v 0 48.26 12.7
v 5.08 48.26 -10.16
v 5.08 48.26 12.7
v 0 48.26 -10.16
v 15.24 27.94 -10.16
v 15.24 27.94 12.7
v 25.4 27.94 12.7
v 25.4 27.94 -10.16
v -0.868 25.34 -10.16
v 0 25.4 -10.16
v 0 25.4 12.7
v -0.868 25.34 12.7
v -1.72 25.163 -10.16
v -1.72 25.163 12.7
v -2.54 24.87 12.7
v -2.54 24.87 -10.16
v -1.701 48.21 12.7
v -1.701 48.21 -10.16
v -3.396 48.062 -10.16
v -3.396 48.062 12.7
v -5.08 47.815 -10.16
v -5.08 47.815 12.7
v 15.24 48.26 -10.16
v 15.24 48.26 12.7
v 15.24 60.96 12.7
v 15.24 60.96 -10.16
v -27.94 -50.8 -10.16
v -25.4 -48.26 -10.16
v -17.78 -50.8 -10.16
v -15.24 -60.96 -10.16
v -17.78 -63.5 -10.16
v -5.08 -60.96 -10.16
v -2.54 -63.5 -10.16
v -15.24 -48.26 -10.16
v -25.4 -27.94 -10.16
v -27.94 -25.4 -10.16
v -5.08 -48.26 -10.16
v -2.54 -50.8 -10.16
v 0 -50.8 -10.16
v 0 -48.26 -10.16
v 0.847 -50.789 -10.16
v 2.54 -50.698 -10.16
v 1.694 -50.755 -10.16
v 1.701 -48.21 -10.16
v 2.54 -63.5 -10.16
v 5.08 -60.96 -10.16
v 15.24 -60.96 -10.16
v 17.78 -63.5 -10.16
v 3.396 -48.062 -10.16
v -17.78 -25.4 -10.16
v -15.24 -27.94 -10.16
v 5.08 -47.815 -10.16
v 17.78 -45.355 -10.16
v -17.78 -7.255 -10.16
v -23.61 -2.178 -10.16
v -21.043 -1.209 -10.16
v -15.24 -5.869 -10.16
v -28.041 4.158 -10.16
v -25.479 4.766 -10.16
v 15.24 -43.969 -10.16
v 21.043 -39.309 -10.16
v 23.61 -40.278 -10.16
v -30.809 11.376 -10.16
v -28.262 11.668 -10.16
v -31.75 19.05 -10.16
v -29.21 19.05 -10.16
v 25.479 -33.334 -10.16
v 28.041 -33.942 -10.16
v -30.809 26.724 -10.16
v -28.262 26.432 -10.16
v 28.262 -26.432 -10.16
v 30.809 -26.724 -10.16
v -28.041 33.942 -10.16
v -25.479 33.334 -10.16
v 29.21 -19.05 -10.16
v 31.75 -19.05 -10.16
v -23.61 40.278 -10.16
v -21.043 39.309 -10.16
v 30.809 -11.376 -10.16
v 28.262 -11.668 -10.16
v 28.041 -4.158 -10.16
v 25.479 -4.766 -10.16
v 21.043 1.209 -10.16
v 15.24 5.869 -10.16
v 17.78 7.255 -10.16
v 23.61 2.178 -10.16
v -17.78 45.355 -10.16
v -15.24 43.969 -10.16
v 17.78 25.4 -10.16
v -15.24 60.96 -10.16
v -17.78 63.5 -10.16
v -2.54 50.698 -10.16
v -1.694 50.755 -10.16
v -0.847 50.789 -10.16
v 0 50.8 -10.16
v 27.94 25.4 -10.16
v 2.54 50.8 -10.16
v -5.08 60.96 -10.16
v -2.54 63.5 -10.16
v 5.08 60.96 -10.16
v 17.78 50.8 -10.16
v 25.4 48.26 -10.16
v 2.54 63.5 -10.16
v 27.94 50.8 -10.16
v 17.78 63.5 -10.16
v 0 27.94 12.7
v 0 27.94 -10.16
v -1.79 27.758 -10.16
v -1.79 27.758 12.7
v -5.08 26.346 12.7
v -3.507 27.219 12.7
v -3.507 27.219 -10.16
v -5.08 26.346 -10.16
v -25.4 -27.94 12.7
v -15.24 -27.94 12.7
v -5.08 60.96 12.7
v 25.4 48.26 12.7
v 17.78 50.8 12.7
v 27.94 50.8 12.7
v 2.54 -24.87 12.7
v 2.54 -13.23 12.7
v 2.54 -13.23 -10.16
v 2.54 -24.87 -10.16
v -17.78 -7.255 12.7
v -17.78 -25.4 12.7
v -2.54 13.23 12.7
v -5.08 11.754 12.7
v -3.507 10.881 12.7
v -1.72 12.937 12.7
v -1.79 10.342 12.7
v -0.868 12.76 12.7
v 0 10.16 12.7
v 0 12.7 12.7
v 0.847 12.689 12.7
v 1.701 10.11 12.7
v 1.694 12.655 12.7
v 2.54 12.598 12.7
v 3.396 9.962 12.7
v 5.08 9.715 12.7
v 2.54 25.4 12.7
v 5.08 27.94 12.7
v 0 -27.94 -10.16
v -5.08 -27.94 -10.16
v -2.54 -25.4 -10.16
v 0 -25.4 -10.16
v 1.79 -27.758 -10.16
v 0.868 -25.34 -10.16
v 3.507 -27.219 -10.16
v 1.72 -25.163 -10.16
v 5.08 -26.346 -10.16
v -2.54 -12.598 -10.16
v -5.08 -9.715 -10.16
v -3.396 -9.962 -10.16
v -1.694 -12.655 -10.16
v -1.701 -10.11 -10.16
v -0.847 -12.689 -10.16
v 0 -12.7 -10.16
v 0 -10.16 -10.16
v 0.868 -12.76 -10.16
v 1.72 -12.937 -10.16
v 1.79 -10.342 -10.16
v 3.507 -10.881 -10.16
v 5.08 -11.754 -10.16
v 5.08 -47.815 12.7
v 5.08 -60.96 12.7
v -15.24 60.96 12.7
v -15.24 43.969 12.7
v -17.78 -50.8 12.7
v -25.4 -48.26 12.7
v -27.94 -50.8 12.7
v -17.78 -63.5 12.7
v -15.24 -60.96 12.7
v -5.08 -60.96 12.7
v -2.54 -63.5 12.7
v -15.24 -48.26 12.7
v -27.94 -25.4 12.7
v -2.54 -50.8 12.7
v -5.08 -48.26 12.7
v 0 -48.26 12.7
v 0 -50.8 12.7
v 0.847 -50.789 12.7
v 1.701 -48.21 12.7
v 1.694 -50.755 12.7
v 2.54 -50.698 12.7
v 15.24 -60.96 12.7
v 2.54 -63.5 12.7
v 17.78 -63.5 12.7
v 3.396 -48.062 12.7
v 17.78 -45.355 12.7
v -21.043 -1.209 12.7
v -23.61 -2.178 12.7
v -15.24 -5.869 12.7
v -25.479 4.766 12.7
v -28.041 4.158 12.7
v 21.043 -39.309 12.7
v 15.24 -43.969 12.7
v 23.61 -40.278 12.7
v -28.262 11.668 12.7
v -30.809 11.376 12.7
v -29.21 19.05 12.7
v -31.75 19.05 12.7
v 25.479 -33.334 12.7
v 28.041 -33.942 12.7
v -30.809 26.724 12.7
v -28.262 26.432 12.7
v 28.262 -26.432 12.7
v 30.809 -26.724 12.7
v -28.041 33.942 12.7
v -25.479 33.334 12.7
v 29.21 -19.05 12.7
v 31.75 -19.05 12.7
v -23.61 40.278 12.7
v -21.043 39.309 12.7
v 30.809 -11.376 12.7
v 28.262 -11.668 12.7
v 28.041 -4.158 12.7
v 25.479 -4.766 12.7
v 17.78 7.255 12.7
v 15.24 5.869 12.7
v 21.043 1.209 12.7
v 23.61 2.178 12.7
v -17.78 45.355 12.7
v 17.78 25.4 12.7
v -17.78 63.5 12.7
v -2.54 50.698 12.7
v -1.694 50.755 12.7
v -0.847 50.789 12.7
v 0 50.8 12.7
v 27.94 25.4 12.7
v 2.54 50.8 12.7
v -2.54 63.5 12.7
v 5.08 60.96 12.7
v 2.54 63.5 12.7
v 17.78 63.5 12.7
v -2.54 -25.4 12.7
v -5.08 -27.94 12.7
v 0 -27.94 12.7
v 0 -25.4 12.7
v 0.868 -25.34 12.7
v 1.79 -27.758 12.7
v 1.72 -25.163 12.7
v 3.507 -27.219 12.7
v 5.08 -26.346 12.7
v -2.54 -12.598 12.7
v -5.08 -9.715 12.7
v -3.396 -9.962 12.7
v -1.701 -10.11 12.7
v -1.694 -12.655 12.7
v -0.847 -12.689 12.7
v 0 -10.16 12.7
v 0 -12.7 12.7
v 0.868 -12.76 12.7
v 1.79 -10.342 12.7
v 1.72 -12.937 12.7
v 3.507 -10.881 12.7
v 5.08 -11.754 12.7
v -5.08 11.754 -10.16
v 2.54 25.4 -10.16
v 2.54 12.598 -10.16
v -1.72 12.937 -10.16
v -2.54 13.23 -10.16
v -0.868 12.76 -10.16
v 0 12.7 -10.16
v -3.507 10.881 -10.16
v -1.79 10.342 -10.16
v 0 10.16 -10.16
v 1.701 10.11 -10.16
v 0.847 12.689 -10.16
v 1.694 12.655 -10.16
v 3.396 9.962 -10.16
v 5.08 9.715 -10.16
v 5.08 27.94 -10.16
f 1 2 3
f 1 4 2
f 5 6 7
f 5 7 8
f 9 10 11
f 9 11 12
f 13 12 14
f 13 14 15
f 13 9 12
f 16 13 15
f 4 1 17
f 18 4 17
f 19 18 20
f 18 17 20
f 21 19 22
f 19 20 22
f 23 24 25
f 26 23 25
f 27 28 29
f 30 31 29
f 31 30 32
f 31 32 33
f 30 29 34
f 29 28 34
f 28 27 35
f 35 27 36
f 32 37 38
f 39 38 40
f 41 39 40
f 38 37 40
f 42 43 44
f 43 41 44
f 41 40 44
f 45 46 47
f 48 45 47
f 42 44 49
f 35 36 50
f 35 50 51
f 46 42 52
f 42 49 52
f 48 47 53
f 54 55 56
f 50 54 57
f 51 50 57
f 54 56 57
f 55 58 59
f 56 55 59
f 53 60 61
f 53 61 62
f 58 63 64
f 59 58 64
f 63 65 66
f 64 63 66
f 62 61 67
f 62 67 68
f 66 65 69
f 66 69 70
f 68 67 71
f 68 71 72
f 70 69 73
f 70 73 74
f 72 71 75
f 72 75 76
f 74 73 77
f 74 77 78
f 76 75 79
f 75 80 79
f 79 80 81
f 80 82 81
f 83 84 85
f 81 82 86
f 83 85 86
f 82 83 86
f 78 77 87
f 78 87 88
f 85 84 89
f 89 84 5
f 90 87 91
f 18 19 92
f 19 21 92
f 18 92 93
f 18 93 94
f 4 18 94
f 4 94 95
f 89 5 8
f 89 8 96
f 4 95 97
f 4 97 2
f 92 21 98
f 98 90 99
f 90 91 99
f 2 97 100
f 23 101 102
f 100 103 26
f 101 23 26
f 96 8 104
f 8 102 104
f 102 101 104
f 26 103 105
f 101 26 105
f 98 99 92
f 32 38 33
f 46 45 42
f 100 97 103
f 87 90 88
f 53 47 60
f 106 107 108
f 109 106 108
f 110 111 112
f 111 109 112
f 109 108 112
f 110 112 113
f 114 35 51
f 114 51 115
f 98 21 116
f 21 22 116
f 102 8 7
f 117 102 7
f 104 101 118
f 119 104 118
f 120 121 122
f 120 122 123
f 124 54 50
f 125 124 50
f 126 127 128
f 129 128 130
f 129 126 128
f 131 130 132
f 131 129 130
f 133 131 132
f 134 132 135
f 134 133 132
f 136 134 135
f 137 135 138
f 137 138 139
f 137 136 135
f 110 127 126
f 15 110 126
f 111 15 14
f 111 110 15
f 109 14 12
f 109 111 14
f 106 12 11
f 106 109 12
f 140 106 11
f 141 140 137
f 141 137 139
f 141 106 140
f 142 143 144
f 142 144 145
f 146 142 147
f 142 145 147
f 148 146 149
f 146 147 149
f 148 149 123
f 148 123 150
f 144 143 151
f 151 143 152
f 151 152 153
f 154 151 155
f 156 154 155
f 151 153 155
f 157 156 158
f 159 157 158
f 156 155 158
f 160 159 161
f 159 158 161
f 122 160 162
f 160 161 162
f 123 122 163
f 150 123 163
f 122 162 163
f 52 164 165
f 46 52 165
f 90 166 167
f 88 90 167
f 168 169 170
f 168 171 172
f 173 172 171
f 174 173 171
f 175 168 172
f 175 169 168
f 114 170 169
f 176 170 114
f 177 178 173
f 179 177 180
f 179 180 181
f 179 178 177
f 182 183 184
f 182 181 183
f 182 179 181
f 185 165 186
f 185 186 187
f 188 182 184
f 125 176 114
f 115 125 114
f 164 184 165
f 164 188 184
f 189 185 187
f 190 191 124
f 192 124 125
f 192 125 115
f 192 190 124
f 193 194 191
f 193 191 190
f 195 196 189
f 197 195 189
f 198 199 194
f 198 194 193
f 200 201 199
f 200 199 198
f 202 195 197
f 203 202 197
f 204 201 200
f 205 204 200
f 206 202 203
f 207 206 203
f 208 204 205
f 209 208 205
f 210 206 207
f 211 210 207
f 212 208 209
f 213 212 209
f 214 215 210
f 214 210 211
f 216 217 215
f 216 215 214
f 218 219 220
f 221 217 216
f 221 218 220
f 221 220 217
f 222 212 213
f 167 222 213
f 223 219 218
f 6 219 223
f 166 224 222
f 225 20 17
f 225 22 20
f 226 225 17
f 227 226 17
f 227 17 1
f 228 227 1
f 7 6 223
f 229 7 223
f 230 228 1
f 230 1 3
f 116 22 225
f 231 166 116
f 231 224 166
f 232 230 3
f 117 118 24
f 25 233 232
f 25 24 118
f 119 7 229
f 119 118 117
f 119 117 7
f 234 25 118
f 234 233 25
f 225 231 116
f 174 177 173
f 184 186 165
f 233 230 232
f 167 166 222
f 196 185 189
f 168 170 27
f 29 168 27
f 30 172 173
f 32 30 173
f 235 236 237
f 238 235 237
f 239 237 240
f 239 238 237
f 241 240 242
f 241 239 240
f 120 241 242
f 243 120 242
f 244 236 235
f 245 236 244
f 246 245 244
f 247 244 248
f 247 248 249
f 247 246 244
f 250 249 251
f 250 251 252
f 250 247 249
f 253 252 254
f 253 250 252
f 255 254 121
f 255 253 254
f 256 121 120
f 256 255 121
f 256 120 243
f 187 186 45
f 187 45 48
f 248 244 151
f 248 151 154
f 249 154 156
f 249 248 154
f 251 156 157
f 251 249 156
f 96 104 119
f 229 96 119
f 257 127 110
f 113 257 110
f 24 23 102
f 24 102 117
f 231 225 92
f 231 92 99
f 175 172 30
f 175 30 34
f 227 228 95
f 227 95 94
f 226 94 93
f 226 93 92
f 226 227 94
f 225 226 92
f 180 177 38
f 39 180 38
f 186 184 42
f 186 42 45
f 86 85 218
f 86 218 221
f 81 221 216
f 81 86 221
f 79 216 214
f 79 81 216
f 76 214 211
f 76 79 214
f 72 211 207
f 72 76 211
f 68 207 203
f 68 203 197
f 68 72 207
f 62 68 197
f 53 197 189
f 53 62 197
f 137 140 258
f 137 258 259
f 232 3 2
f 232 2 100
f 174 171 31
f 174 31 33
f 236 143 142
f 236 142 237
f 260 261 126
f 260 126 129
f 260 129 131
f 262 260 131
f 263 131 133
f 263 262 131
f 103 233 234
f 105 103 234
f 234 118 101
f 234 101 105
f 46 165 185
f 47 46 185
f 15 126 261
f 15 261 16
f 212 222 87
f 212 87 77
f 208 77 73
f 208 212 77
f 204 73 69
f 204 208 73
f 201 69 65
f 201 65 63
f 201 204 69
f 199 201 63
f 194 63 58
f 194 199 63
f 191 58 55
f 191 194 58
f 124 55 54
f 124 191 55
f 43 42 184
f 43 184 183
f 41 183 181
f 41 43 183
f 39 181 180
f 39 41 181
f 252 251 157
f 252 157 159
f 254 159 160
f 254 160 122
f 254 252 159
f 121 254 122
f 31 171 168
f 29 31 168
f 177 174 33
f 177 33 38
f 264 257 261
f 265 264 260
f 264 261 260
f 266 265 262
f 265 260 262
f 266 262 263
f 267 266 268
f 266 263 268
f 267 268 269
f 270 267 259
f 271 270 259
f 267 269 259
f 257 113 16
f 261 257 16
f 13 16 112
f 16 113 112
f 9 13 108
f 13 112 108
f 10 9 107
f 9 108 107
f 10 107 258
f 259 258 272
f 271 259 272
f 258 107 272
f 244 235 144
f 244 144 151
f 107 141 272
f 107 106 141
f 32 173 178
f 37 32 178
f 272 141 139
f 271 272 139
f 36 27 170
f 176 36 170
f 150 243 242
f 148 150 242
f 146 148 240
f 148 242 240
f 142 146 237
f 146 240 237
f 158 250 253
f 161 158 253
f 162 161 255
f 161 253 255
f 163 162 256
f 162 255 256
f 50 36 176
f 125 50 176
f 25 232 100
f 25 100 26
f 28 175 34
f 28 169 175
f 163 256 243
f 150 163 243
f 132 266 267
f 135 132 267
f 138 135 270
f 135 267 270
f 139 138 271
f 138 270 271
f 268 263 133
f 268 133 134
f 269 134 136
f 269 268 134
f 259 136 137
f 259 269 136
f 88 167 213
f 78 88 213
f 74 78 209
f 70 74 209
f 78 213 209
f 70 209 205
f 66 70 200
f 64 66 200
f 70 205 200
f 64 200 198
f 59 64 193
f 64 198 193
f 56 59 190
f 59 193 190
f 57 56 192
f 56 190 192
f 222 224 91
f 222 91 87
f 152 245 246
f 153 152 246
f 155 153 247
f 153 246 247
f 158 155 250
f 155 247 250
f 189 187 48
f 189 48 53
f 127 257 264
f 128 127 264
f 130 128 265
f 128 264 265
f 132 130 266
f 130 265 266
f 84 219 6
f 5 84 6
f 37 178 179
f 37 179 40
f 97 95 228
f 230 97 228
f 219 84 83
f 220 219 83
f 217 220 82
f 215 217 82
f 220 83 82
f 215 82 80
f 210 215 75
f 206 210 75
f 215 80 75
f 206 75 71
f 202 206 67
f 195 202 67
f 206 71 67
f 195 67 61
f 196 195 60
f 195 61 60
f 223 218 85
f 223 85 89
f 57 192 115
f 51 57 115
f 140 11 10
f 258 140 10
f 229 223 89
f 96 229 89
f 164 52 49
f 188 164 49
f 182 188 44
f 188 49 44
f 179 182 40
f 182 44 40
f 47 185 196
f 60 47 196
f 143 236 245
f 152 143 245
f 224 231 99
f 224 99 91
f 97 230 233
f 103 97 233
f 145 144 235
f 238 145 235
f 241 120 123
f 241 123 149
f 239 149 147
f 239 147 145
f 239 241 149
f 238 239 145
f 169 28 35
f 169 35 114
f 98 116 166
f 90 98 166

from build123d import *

# Parameters (mm, degrees)
F2_W     = 25.4
F2_H     = 25.4
F4_W     = 15.24
F4_H     = 12.7
F5_DEPTH = 25.4
F6_T     = -2.54
F7_DEPTH = 2.54


with BuildPart() as f3:
    # F3: sweep along a path in F0
    with BuildLine(Plane.XY) as f3_path:
        Line((27.94, 38.1), (0, 38.1))
        ThreePointArc((0, 38.1), (-19.05, 19.05), (0, 0))
        ThreePointArc((0, 0), (19.05, -19.05), (0, -38.1))
        Line((0, -38.1), (-27.94, -38.1))
    # F2 (on offset) → F3 (sweep)
    with BuildSketch(Plane.YZ.offset(27.94)):
        with Locations((38.1, 0)):
            Rectangle(F2_W, F2_H)
    sweep(path=f3_path.line)

    # F4 (on face) → F5 (join)
    with BuildSketch(Plane.XY.offset(12.7)):
        with BuildLine():
            Line((-2.54, 63.5), (-17.78, 63.5))
            Line((-17.78, 63.5), (-17.78, 45.3546402751))
            ThreePointArc((-17.78, 45.3546402751), (-10.5054322267, 49.0116153391), (-2.54, 50.6982369177))
            Line((-2.54, 50.6982369177), (-2.54, 63.5))
        make_face()
        with BuildLine():
            ThreePointArc((-2.54, 50.6982369177), (-10.5054322267, 49.0116153391), (-17.78, 45.3546402751))
            Line((-17.78, 45.3546402751), (-17.78, -7.2546402751))
            ThreePointArc((-17.78, -7.2546402751), (-10.5054322267, -10.9116153391), (-2.54, -12.5982369177))
            Line((-2.54, -12.5982369177), (-2.54, 13.2301288674))
            ThreePointArc((-2.54, 13.2301288674), (-6.35, 19.05), (-2.54, 24.8698711326))
            Line((-2.54, 24.8698711326), (-2.54, 50.6982369177))
        make_face()
        with BuildLine():
            ThreePointArc((-2.54, -12.5982369177), (-10.5054322267, -10.9116153391), (-17.78, -7.2546402751))
            Line((-17.78, -7.2546402751), (-17.78, -25.4))
            Line((-17.78, -25.4), (-2.54, -25.4))
            Line((-2.54, -25.4), (-2.54, -12.5982369177))
        make_face()
        with BuildLine():
            Line((-2.54, 13.2301288674), (-2.54, 24.8698711326))
            ThreePointArc((-2.54, 24.8698711326), (-6.35, 19.05), (-2.54, 13.2301288674))
        make_face()
        with Locations((10.16, 57.15)):
            Rectangle(F4_W, F4_H)
        with Locations((-10.16, -57.15)):
            Rectangle(F4_W, F4_H)
        with BuildLine():
            Line((17.78, 25.4), (2.54, 25.4))
            Line((2.54, 25.4), (2.54, 12.5982369177))
            ThreePointArc((2.54, 12.5982369177), (10.5054322267, 10.9116153391), (17.78, 7.2546402751))
            Line((17.78, 7.2546402751), (17.78, 25.4))
        make_face()
        with BuildLine():
            ThreePointArc((2.54, -24.8698711326), (6.35, -19.05), (2.54, -13.2301288674))
            Line((2.54, -13.2301288674), (2.54, -24.8698711326))
        make_face()
        with BuildLine():
            ThreePointArc((17.78, -45.3546402751), (10.5054322267, -49.0116153391), (2.54, -50.6982369177))
            Line((2.54, -50.6982369177), (2.54, -63.5))
            Line((2.54, -63.5), (17.78, -63.5))
            Line((17.78, -63.5), (17.78, -45.3546402751))
        make_face()
    extrude(amount=-F5_DEPTH)

    # F6
    f6_openings = [f3.faces().sort_by_distance(p)[0] for p in [
        (0, 0, 12.7),
    ]]
    offset(amount=F6_T, openings=f6_openings, kind=Kind.INTERSECTION)

    # F7 (cut): a face of the model
    f7_faces = [f3.faces().sort_by_distance(p)[0] for p in [
        (0, 0, -12.7),
    ]]
    extrude(f7_faces, amount=-F7_DEPTH, mode=Mode.SUBTRACT)


solid = f3.part
